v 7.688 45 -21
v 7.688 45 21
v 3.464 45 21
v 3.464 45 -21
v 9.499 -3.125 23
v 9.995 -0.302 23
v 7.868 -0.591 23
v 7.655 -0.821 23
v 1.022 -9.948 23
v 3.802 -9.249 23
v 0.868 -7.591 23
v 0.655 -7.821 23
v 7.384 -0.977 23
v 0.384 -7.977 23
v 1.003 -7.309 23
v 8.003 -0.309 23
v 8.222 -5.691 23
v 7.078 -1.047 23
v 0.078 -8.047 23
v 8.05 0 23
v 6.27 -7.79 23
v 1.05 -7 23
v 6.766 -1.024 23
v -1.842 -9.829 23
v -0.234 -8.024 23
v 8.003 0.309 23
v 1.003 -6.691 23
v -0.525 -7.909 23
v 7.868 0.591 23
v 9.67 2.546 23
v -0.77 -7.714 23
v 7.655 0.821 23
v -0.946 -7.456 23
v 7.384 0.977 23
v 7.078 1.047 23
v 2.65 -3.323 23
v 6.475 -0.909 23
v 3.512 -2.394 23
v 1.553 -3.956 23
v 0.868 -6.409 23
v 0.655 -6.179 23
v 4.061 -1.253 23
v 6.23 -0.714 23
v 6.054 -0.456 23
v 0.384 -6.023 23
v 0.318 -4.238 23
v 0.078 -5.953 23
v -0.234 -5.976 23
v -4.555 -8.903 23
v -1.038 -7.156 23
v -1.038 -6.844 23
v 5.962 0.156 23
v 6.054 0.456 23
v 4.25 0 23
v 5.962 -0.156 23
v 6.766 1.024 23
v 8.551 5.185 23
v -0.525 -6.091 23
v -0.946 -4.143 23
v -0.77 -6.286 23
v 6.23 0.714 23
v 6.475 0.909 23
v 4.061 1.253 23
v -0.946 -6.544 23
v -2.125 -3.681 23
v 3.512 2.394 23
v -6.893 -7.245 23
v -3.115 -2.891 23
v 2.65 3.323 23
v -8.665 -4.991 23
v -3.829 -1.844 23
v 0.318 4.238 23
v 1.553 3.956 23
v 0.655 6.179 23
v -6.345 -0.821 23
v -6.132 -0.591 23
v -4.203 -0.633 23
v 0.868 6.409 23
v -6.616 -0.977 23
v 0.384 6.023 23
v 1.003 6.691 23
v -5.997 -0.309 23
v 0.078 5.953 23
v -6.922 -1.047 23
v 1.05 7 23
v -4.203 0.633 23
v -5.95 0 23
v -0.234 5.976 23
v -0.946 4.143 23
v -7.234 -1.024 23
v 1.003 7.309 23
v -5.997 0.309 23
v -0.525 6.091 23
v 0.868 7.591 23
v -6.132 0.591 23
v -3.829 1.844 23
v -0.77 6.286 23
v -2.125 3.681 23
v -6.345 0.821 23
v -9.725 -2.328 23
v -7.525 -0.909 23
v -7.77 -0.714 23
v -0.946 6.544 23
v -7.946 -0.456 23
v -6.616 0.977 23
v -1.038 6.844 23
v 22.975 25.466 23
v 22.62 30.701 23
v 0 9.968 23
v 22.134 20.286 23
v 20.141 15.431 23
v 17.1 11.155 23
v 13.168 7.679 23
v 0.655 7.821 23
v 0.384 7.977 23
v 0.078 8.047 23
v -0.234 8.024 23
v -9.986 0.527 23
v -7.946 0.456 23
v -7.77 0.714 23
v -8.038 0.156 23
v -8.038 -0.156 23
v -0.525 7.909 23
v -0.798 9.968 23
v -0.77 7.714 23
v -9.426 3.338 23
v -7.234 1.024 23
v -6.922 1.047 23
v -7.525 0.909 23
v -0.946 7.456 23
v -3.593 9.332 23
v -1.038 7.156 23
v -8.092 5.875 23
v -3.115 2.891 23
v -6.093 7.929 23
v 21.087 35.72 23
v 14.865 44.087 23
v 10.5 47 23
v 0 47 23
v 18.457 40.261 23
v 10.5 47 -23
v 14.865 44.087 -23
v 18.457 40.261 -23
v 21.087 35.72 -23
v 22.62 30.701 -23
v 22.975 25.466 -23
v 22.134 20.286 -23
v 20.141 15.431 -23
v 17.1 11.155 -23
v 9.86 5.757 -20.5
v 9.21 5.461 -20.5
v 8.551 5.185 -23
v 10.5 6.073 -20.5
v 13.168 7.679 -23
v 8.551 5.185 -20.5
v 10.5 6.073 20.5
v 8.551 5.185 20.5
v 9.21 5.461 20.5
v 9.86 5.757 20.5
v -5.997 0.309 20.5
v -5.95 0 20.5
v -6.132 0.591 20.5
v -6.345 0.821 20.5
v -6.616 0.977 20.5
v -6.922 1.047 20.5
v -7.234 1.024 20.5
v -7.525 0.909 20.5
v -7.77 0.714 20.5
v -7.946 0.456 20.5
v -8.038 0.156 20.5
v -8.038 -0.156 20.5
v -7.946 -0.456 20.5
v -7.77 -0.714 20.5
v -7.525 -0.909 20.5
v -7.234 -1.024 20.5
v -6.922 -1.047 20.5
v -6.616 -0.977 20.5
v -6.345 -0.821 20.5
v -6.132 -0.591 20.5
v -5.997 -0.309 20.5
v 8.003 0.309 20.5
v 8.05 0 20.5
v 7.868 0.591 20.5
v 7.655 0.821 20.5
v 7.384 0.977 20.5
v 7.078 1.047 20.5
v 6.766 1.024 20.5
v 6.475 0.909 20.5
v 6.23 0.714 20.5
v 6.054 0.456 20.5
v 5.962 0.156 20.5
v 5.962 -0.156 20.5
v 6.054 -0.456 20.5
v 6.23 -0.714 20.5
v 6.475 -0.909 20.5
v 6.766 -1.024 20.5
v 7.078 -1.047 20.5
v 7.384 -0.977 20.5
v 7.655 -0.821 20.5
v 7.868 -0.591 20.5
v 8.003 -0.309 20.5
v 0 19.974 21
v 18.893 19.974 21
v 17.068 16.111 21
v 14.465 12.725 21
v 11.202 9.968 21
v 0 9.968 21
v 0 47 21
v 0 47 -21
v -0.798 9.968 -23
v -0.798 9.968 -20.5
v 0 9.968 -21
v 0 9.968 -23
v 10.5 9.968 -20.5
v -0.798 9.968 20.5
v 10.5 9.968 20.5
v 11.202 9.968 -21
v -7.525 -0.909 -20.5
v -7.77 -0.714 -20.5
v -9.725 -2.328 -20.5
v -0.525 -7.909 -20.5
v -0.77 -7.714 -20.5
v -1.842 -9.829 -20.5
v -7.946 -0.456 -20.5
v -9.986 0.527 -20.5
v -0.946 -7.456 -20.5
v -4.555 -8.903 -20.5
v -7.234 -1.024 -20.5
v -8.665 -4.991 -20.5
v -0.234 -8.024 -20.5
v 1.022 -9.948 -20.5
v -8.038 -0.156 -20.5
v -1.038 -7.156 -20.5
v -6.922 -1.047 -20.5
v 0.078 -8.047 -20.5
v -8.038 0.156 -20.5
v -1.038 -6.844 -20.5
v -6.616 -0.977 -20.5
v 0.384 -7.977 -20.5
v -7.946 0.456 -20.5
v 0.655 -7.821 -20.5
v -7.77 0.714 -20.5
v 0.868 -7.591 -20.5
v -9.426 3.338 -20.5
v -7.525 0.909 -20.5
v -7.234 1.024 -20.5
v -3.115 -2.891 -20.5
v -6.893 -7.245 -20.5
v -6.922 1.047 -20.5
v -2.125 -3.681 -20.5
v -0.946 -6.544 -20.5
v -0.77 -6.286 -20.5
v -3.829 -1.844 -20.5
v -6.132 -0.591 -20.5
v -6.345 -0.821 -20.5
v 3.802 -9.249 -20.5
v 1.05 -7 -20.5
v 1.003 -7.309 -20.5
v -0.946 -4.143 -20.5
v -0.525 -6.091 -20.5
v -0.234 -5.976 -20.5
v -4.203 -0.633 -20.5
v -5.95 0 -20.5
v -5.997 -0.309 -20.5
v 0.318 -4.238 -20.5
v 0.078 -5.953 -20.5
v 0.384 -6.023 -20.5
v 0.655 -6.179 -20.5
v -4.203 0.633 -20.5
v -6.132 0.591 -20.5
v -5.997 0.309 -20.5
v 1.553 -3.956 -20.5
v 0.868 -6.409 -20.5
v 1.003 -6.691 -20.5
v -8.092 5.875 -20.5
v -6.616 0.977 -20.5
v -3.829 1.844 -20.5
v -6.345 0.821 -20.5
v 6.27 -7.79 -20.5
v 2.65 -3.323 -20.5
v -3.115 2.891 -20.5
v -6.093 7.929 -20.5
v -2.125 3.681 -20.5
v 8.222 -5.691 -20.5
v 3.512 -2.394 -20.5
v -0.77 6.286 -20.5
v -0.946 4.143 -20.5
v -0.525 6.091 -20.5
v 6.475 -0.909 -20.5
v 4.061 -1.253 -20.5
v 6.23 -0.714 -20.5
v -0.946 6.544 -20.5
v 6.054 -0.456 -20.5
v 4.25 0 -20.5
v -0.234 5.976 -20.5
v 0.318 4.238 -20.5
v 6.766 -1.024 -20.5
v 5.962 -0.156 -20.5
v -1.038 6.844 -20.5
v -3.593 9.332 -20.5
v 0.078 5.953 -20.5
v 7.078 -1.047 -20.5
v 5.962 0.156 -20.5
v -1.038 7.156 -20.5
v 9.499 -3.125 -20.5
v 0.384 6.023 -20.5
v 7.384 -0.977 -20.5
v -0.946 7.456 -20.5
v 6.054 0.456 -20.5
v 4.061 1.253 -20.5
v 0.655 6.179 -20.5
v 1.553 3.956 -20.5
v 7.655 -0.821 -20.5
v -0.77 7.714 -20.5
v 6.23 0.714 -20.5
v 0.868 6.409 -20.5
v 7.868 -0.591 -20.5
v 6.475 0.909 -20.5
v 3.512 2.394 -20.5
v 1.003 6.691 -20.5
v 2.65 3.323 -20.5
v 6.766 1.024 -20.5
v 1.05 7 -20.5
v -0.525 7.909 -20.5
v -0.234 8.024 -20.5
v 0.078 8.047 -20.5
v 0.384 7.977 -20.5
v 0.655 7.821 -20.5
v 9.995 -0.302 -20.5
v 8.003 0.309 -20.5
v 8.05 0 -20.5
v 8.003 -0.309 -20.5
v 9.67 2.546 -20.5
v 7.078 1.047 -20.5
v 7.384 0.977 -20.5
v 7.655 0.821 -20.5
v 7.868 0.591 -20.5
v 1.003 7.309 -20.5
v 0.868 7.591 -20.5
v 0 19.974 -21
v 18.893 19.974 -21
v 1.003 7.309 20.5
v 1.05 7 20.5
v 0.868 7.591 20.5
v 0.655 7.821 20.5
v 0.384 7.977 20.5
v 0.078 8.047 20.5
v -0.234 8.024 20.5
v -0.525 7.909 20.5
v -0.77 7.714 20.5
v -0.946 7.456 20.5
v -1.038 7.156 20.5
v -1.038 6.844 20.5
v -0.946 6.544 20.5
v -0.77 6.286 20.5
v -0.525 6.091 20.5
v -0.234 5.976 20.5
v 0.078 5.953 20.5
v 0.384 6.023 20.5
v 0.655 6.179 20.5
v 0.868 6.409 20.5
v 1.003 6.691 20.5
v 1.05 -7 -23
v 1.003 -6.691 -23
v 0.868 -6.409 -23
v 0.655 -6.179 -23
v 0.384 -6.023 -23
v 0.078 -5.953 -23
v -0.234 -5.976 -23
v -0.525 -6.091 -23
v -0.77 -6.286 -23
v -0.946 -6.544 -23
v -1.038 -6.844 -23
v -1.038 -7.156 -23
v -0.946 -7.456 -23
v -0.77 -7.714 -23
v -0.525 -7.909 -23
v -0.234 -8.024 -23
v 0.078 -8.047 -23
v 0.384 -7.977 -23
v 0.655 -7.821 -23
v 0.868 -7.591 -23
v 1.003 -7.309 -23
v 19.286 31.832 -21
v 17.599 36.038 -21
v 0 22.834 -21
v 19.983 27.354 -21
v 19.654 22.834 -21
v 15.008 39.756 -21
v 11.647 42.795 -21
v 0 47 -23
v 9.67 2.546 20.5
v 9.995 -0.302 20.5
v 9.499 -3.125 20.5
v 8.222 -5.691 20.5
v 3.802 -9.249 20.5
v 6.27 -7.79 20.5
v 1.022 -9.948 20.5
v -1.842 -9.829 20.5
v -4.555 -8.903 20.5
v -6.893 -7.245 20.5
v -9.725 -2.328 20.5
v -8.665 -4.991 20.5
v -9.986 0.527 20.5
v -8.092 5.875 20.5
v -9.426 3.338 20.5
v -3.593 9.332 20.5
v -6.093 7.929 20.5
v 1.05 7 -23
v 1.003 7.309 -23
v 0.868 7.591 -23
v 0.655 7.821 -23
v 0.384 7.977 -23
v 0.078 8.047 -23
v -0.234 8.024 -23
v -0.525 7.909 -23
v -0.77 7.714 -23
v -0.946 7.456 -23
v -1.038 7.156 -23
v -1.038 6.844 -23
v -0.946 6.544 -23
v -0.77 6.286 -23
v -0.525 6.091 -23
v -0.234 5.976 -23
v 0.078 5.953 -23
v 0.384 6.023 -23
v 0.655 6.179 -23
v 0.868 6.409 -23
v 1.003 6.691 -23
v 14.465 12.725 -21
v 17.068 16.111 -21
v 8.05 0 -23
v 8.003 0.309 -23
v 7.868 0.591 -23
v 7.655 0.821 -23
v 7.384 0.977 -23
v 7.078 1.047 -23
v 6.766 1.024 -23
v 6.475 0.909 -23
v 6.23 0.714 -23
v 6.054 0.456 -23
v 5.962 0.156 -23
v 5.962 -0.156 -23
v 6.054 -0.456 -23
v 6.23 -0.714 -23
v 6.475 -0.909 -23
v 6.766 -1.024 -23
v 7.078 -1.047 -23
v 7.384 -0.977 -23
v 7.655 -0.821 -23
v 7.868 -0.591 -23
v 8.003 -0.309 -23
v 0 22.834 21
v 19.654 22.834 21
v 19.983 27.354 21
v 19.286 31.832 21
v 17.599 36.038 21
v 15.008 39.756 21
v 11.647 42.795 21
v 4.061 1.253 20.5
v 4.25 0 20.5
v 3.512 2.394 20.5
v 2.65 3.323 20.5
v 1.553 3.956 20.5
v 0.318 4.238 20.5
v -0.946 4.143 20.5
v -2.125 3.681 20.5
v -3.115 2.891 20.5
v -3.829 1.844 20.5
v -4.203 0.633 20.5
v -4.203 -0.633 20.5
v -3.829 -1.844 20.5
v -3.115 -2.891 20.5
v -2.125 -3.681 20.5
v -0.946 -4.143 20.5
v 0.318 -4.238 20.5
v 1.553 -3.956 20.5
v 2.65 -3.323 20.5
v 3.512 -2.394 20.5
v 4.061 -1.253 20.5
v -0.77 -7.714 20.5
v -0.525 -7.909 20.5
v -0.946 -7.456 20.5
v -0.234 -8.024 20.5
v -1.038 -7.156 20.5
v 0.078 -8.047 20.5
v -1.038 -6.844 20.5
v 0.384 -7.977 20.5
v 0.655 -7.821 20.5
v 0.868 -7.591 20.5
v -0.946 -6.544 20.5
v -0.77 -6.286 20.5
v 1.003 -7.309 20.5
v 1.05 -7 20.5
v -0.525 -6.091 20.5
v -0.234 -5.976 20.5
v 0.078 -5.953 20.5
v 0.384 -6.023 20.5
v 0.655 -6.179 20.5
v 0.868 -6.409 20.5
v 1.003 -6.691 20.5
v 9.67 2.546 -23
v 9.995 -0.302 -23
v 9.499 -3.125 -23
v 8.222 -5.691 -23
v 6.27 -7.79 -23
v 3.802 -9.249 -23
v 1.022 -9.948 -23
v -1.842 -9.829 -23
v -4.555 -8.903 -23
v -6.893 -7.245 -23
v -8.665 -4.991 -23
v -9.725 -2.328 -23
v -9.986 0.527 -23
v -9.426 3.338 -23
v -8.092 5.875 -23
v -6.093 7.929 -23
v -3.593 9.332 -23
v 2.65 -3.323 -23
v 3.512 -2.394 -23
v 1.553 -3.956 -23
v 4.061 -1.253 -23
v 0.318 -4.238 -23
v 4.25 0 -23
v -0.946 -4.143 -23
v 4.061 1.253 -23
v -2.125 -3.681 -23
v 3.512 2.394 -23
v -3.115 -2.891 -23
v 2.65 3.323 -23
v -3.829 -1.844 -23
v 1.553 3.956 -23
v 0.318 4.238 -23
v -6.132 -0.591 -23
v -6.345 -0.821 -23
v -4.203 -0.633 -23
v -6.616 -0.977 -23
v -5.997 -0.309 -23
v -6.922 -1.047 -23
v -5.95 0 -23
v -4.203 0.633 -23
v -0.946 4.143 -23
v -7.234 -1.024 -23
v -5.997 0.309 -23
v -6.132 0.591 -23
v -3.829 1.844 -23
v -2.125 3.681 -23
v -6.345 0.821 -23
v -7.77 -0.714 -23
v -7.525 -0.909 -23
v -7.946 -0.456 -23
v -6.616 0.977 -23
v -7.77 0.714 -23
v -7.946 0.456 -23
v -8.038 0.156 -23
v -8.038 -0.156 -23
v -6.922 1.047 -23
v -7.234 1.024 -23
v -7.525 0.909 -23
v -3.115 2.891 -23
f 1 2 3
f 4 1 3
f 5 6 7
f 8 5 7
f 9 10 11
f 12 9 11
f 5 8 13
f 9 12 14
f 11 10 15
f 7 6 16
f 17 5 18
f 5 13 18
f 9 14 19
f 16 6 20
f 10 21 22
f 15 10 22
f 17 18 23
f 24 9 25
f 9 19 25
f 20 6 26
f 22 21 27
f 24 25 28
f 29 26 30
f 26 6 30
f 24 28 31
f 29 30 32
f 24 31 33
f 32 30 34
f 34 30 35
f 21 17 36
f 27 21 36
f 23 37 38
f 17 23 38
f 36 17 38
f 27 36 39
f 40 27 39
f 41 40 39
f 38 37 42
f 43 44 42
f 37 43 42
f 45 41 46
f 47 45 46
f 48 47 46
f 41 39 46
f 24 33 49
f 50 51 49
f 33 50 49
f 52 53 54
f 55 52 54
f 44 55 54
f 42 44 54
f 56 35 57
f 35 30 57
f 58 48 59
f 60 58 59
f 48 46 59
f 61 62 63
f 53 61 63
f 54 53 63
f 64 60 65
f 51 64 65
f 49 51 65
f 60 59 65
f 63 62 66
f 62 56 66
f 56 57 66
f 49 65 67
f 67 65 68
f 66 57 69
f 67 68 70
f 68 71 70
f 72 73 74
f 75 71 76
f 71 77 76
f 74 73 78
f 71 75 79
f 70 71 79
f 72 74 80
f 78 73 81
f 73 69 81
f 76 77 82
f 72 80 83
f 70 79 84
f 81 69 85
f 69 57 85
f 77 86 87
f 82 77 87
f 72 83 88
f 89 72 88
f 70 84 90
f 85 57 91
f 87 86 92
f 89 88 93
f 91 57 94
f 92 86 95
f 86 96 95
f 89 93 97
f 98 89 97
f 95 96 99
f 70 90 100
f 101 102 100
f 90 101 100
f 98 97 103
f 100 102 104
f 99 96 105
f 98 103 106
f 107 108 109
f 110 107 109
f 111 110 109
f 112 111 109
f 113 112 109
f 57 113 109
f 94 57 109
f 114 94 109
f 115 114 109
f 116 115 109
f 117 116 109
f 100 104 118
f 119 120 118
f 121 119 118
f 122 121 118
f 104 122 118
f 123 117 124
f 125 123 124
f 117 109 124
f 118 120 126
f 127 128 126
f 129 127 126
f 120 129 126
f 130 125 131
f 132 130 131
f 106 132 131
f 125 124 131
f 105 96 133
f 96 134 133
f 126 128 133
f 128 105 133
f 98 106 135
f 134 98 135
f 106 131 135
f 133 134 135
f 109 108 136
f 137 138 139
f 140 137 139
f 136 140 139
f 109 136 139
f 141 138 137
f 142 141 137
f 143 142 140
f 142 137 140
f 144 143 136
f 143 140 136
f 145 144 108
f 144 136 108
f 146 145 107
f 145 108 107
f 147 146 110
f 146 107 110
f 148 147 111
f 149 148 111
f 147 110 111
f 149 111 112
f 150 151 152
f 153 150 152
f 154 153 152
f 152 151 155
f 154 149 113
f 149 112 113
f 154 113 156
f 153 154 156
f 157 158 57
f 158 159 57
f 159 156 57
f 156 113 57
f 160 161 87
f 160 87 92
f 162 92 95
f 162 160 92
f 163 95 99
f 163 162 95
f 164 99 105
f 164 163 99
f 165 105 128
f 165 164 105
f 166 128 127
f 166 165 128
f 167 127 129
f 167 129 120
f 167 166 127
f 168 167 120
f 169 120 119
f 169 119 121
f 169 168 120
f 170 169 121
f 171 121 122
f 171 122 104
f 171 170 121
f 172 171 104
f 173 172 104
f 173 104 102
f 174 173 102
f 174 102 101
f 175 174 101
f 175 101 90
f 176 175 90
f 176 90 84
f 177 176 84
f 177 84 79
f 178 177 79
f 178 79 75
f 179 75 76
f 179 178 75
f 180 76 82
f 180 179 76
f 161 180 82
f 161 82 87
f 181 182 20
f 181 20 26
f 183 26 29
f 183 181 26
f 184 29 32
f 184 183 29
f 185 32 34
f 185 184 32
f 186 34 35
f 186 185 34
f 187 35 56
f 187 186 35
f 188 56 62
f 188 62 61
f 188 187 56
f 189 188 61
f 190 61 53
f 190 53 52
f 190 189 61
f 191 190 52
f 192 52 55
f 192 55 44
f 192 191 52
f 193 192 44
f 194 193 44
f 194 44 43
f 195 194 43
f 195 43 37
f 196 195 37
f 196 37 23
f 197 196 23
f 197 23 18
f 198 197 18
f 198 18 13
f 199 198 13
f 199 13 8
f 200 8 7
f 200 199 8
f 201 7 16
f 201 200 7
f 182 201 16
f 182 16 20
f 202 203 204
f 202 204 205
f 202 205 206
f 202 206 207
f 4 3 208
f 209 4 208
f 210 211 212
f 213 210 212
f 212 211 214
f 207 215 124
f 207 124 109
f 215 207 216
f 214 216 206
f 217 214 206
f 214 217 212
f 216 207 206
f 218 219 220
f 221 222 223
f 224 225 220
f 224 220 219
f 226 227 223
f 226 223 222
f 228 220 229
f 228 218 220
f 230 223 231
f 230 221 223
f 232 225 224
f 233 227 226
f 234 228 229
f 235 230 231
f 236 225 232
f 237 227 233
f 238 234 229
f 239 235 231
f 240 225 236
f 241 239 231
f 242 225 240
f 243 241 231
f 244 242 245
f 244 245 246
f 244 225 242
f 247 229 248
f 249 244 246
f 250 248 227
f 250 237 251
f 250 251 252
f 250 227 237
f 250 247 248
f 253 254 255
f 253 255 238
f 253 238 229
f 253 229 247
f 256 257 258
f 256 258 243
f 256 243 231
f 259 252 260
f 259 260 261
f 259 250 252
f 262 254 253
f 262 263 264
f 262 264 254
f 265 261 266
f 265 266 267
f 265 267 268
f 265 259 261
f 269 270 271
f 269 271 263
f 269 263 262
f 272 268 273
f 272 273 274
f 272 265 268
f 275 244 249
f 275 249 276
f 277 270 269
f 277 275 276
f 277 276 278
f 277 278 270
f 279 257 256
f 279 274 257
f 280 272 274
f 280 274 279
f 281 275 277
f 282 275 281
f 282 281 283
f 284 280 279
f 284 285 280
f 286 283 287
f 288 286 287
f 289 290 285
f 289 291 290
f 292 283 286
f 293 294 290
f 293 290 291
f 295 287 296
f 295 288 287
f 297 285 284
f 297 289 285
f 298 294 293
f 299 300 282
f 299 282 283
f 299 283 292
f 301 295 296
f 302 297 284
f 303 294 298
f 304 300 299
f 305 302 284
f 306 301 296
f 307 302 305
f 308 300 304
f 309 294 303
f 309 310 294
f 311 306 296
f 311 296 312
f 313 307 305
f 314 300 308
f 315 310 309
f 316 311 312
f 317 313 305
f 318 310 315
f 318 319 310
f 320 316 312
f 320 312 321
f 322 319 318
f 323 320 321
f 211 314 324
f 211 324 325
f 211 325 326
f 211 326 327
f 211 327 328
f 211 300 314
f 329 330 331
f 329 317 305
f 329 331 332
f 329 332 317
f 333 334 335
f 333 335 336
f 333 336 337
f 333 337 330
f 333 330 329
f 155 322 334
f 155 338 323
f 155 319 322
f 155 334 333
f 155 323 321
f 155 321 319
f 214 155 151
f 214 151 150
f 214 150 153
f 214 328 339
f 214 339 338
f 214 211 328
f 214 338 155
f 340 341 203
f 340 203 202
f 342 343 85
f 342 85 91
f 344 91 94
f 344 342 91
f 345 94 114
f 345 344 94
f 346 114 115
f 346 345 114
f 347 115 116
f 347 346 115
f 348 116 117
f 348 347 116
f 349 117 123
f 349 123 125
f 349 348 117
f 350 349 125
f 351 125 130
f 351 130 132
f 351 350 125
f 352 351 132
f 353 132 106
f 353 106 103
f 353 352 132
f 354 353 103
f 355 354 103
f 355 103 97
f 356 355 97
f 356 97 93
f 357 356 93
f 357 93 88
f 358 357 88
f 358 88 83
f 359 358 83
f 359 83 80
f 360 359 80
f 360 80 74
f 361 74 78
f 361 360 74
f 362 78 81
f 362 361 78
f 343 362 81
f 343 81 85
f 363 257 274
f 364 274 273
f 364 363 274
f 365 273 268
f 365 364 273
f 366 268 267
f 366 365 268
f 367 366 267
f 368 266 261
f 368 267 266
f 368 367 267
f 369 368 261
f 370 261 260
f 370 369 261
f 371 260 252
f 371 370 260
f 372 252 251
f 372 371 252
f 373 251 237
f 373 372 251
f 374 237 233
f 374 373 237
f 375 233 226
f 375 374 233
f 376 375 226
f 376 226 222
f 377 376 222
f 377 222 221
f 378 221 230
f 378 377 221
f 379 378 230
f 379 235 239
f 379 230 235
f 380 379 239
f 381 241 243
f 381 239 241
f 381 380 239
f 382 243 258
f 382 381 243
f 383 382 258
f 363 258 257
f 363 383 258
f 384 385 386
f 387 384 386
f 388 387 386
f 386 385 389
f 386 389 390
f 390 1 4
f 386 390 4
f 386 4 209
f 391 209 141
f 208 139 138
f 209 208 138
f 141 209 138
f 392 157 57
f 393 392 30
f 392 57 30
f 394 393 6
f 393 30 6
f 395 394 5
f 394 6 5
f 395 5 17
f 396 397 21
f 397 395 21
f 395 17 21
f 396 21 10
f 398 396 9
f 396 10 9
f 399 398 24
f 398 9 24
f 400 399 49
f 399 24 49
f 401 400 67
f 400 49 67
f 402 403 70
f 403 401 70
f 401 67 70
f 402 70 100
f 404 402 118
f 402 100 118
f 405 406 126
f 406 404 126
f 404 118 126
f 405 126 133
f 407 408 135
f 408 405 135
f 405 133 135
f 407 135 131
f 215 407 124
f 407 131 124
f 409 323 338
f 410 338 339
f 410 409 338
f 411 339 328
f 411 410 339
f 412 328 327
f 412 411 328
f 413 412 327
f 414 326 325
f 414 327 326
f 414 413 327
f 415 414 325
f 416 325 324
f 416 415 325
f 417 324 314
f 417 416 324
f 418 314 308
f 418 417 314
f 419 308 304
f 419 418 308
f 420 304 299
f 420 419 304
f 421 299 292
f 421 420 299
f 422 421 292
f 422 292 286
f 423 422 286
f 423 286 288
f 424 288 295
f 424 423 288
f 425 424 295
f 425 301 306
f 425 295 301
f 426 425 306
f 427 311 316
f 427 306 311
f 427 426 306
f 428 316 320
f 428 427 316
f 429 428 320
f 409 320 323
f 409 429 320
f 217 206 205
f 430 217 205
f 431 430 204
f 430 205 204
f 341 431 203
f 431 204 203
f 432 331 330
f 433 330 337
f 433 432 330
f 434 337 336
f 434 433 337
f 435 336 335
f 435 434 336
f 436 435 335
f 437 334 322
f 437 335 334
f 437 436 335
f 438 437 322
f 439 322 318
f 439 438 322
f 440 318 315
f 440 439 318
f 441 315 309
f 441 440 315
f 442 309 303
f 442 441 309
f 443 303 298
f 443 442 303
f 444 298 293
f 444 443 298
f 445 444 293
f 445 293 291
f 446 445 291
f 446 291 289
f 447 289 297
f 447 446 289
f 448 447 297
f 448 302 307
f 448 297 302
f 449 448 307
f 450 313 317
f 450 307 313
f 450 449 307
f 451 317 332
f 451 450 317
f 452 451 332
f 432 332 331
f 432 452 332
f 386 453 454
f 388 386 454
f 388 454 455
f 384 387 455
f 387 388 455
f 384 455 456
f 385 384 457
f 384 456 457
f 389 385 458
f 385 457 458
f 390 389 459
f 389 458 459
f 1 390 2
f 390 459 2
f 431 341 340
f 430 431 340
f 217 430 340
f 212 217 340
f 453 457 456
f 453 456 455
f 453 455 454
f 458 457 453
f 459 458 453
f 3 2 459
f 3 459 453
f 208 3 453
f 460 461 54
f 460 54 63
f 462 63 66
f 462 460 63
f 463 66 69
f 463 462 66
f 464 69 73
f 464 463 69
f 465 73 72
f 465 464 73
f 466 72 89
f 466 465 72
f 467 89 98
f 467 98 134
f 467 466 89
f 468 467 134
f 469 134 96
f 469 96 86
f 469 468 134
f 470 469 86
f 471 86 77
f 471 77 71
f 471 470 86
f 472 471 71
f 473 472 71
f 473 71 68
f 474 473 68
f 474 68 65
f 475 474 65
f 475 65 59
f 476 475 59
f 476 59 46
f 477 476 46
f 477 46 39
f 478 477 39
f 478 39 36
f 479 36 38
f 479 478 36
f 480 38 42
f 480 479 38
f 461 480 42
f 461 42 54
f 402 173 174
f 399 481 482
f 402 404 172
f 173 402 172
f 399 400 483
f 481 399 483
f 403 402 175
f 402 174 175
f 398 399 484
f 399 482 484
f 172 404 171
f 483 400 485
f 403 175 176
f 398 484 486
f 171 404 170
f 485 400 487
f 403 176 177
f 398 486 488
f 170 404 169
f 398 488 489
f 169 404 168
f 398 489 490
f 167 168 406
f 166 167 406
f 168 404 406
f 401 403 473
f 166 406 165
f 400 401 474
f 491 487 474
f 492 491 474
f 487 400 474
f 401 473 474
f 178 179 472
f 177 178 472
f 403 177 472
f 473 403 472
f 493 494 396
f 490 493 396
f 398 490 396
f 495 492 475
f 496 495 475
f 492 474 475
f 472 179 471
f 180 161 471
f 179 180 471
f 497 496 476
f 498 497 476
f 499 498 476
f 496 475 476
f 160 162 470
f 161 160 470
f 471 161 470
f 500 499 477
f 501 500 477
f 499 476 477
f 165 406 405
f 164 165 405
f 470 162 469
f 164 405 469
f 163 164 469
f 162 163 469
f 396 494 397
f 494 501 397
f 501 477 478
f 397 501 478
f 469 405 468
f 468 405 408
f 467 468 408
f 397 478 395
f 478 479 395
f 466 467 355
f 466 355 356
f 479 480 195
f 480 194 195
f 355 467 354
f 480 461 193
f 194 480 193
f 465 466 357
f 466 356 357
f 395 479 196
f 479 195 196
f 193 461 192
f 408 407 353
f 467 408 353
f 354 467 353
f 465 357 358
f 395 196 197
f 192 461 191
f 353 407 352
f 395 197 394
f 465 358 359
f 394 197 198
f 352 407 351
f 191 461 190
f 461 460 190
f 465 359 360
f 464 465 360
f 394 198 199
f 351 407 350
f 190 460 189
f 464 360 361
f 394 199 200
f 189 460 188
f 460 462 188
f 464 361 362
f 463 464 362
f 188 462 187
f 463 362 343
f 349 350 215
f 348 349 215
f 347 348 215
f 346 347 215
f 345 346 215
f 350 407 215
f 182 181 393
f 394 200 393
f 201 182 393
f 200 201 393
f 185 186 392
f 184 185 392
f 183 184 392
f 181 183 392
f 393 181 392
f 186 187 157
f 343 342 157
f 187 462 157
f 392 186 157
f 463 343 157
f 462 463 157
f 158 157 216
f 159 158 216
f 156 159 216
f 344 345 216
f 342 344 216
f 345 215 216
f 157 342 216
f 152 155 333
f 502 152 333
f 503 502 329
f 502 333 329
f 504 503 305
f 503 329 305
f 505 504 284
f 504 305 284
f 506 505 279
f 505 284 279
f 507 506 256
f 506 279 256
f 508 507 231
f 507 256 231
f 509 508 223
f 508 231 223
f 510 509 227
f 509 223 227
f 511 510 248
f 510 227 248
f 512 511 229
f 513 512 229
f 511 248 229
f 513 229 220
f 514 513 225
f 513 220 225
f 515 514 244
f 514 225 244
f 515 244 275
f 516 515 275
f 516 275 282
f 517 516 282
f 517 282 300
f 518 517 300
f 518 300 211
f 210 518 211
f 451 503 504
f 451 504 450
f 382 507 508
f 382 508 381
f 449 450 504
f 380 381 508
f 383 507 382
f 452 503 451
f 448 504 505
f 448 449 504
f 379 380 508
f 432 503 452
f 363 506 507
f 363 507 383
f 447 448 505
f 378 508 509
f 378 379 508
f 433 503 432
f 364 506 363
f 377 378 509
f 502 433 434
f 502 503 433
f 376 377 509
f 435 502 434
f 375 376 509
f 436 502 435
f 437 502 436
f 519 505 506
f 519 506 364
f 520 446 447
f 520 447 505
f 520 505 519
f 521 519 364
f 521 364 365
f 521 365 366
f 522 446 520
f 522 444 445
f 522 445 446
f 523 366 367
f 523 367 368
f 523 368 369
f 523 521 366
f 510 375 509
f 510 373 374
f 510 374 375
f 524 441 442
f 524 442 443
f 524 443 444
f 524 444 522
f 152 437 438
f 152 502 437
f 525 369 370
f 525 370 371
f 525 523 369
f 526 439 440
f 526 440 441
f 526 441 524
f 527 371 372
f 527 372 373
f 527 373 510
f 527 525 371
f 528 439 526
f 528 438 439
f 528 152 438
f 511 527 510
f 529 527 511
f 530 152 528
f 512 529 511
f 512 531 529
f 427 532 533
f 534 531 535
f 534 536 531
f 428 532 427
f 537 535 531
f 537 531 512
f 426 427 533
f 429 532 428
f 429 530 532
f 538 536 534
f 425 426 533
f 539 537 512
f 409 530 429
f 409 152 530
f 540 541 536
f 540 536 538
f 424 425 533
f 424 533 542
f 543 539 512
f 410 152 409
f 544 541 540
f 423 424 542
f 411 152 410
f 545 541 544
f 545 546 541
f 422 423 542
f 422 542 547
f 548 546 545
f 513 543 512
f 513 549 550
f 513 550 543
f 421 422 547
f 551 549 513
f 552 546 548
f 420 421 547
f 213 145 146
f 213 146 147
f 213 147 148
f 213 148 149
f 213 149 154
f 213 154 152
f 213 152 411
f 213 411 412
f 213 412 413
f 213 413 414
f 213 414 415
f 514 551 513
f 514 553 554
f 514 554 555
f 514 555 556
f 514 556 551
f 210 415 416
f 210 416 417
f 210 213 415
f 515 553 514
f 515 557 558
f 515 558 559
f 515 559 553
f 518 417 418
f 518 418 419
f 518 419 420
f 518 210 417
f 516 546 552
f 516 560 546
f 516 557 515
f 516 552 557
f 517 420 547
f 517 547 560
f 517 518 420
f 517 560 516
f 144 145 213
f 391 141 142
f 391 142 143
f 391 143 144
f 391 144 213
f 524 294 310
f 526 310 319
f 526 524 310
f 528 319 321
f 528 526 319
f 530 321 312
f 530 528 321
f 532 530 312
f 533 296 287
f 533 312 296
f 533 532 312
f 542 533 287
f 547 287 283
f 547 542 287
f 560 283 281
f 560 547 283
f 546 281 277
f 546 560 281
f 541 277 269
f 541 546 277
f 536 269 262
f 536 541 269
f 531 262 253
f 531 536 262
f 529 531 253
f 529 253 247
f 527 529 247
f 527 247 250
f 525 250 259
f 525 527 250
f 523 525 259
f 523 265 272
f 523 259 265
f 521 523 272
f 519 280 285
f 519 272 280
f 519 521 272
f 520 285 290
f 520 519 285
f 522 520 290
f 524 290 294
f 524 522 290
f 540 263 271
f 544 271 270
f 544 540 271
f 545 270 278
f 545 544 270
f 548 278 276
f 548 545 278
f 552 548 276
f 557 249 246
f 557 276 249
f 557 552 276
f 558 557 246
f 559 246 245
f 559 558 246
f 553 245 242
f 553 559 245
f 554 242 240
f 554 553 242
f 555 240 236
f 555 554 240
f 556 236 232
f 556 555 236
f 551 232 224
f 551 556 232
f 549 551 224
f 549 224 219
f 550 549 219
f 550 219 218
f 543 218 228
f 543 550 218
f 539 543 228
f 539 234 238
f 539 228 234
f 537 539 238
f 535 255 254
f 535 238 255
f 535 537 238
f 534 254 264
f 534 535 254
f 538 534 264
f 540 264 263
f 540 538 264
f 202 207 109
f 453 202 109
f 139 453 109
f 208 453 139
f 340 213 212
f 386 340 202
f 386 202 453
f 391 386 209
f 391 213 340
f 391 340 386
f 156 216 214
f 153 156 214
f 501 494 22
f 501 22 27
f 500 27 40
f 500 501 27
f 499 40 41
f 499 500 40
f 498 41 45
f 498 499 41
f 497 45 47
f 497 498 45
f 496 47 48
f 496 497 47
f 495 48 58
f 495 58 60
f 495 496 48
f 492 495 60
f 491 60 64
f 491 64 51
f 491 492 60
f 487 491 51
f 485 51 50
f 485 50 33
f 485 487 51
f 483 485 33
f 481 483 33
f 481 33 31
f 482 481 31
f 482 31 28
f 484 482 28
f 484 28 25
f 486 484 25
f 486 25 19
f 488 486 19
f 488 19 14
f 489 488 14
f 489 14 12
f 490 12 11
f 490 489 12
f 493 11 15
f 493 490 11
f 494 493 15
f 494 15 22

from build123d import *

# Parameters (mm, degrees)
SKETCH1_R           = 4.25
SKETCH1_R_2         = 1.05
BOSS_EXTRUDE1_DEPTH = 23
BOSS_EXTRUDE3_DEPTH = 2
SKETCH4_W           = 21
SKETCH4_H           = 41
CUT_EXTRUDE1_DEPTH  = 50.288548817
BOSS_EXTRUDE4_START = 42
BOSS_EXTRUDE4_DEPTH = 42


with BuildPart() as part:
    # Sketch1 → Boss-Extrude1 (new, symmetric)
    with BuildSketch(Plane.XY):
        with BuildLine():
            Line((-0.798015115, 9.968107738), (11.201984885, 9.968107738))
            ThreePointArc((11.201984885, 9.968107738), (19.90012903, 28.53283063), (7.687881875, 45))
            Line((7.687881875, 45), (3.464101615, 45))
            Line((3.464101615, 45), (0, 47))
            Line((0, 47), (10.5, 47))
            ThreePointArc((10.5, 47), (22.975048867, 25.465576737), (8.550692083, 5.18513885))
            ThreePointArc((8.550692083, 5.18513885), (-4.554689659, -8.902516617), (-0.798015115, 9.968107738))
        make_face()
        Circle(SKETCH1_R, mode=Mode.SUBTRACT)
        with Locations((0, 7)):
            Circle(SKETCH1_R_2, mode=Mode.SUBTRACT)
        with Locations((7, 0)):
            Circle(SKETCH1_R_2, mode=Mode.SUBTRACT)
        with Locations((0, -7)):
            Circle(SKETCH1_R_2, mode=Mode.SUBTRACT)
        with Locations((-7, 0)):
            Circle(SKETCH1_R_2, mode=Mode.SUBTRACT)
    extrude(amount=BOSS_EXTRUDE1_DEPTH, both=True)

    # Sketch3 → Boss-Extrude3 (add)
    with BuildSketch(Plane.XY.offset(23)):
        with BuildLine():
            Line((0, 47), (3.464101615, 45))
            Line((3.464101615, 45), (7.687881875, 45))
            ThreePointArc((7.687881875, 45), (19.90012903, 28.53283063), (11.201984885, 9.968107738))
            Line((11.201984885, 9.968107738), (0, 9.968107738))
            Line((0, 9.968107738), (0, 47))
        make_face()
    boss_extrude3 = extrude(amount=-BOSS_EXTRUDE3_DEPTH)

    # Mirror1: Boss-Extrude3 across plane
    add(boss_extrude3.mirror(Plane.XY))

    # Sketch4 → Cut-Extrude1 (cut, through all)
    with BuildSketch(Plane(origin=(0, 9.968107738, 0), x_dir=(1, 0, 0), z_dir=(0, 1, 0))):
        Rectangle(SKETCH4_W, SKETCH4_H)
    extrude(amount=-CUT_EXTRUDE1_DEPTH, mode=Mode.SUBTRACT)

    # Sketch6 → Boss-Extrude4 (add)
    with BuildSketch(Plane.XY.offset(-21).offset(BOSS_EXTRUDE4_START)):
        with BuildLine():
            Line((0, 22.833916422), (19.654261637, 22.833916422))
            ThreePointArc((19.654261637, 22.833916422), (19.326374482, 21.389653004), (18.892510823, 19.973613057))
            Line((18.892510823, 19.973613057), (0, 19.973613057))
            Line((0, 19.973613057), (0, 22.833916422))
        make_face()
    extrude(amount=-BOSS_EXTRUDE4_DEPTH)


solid = part.part
